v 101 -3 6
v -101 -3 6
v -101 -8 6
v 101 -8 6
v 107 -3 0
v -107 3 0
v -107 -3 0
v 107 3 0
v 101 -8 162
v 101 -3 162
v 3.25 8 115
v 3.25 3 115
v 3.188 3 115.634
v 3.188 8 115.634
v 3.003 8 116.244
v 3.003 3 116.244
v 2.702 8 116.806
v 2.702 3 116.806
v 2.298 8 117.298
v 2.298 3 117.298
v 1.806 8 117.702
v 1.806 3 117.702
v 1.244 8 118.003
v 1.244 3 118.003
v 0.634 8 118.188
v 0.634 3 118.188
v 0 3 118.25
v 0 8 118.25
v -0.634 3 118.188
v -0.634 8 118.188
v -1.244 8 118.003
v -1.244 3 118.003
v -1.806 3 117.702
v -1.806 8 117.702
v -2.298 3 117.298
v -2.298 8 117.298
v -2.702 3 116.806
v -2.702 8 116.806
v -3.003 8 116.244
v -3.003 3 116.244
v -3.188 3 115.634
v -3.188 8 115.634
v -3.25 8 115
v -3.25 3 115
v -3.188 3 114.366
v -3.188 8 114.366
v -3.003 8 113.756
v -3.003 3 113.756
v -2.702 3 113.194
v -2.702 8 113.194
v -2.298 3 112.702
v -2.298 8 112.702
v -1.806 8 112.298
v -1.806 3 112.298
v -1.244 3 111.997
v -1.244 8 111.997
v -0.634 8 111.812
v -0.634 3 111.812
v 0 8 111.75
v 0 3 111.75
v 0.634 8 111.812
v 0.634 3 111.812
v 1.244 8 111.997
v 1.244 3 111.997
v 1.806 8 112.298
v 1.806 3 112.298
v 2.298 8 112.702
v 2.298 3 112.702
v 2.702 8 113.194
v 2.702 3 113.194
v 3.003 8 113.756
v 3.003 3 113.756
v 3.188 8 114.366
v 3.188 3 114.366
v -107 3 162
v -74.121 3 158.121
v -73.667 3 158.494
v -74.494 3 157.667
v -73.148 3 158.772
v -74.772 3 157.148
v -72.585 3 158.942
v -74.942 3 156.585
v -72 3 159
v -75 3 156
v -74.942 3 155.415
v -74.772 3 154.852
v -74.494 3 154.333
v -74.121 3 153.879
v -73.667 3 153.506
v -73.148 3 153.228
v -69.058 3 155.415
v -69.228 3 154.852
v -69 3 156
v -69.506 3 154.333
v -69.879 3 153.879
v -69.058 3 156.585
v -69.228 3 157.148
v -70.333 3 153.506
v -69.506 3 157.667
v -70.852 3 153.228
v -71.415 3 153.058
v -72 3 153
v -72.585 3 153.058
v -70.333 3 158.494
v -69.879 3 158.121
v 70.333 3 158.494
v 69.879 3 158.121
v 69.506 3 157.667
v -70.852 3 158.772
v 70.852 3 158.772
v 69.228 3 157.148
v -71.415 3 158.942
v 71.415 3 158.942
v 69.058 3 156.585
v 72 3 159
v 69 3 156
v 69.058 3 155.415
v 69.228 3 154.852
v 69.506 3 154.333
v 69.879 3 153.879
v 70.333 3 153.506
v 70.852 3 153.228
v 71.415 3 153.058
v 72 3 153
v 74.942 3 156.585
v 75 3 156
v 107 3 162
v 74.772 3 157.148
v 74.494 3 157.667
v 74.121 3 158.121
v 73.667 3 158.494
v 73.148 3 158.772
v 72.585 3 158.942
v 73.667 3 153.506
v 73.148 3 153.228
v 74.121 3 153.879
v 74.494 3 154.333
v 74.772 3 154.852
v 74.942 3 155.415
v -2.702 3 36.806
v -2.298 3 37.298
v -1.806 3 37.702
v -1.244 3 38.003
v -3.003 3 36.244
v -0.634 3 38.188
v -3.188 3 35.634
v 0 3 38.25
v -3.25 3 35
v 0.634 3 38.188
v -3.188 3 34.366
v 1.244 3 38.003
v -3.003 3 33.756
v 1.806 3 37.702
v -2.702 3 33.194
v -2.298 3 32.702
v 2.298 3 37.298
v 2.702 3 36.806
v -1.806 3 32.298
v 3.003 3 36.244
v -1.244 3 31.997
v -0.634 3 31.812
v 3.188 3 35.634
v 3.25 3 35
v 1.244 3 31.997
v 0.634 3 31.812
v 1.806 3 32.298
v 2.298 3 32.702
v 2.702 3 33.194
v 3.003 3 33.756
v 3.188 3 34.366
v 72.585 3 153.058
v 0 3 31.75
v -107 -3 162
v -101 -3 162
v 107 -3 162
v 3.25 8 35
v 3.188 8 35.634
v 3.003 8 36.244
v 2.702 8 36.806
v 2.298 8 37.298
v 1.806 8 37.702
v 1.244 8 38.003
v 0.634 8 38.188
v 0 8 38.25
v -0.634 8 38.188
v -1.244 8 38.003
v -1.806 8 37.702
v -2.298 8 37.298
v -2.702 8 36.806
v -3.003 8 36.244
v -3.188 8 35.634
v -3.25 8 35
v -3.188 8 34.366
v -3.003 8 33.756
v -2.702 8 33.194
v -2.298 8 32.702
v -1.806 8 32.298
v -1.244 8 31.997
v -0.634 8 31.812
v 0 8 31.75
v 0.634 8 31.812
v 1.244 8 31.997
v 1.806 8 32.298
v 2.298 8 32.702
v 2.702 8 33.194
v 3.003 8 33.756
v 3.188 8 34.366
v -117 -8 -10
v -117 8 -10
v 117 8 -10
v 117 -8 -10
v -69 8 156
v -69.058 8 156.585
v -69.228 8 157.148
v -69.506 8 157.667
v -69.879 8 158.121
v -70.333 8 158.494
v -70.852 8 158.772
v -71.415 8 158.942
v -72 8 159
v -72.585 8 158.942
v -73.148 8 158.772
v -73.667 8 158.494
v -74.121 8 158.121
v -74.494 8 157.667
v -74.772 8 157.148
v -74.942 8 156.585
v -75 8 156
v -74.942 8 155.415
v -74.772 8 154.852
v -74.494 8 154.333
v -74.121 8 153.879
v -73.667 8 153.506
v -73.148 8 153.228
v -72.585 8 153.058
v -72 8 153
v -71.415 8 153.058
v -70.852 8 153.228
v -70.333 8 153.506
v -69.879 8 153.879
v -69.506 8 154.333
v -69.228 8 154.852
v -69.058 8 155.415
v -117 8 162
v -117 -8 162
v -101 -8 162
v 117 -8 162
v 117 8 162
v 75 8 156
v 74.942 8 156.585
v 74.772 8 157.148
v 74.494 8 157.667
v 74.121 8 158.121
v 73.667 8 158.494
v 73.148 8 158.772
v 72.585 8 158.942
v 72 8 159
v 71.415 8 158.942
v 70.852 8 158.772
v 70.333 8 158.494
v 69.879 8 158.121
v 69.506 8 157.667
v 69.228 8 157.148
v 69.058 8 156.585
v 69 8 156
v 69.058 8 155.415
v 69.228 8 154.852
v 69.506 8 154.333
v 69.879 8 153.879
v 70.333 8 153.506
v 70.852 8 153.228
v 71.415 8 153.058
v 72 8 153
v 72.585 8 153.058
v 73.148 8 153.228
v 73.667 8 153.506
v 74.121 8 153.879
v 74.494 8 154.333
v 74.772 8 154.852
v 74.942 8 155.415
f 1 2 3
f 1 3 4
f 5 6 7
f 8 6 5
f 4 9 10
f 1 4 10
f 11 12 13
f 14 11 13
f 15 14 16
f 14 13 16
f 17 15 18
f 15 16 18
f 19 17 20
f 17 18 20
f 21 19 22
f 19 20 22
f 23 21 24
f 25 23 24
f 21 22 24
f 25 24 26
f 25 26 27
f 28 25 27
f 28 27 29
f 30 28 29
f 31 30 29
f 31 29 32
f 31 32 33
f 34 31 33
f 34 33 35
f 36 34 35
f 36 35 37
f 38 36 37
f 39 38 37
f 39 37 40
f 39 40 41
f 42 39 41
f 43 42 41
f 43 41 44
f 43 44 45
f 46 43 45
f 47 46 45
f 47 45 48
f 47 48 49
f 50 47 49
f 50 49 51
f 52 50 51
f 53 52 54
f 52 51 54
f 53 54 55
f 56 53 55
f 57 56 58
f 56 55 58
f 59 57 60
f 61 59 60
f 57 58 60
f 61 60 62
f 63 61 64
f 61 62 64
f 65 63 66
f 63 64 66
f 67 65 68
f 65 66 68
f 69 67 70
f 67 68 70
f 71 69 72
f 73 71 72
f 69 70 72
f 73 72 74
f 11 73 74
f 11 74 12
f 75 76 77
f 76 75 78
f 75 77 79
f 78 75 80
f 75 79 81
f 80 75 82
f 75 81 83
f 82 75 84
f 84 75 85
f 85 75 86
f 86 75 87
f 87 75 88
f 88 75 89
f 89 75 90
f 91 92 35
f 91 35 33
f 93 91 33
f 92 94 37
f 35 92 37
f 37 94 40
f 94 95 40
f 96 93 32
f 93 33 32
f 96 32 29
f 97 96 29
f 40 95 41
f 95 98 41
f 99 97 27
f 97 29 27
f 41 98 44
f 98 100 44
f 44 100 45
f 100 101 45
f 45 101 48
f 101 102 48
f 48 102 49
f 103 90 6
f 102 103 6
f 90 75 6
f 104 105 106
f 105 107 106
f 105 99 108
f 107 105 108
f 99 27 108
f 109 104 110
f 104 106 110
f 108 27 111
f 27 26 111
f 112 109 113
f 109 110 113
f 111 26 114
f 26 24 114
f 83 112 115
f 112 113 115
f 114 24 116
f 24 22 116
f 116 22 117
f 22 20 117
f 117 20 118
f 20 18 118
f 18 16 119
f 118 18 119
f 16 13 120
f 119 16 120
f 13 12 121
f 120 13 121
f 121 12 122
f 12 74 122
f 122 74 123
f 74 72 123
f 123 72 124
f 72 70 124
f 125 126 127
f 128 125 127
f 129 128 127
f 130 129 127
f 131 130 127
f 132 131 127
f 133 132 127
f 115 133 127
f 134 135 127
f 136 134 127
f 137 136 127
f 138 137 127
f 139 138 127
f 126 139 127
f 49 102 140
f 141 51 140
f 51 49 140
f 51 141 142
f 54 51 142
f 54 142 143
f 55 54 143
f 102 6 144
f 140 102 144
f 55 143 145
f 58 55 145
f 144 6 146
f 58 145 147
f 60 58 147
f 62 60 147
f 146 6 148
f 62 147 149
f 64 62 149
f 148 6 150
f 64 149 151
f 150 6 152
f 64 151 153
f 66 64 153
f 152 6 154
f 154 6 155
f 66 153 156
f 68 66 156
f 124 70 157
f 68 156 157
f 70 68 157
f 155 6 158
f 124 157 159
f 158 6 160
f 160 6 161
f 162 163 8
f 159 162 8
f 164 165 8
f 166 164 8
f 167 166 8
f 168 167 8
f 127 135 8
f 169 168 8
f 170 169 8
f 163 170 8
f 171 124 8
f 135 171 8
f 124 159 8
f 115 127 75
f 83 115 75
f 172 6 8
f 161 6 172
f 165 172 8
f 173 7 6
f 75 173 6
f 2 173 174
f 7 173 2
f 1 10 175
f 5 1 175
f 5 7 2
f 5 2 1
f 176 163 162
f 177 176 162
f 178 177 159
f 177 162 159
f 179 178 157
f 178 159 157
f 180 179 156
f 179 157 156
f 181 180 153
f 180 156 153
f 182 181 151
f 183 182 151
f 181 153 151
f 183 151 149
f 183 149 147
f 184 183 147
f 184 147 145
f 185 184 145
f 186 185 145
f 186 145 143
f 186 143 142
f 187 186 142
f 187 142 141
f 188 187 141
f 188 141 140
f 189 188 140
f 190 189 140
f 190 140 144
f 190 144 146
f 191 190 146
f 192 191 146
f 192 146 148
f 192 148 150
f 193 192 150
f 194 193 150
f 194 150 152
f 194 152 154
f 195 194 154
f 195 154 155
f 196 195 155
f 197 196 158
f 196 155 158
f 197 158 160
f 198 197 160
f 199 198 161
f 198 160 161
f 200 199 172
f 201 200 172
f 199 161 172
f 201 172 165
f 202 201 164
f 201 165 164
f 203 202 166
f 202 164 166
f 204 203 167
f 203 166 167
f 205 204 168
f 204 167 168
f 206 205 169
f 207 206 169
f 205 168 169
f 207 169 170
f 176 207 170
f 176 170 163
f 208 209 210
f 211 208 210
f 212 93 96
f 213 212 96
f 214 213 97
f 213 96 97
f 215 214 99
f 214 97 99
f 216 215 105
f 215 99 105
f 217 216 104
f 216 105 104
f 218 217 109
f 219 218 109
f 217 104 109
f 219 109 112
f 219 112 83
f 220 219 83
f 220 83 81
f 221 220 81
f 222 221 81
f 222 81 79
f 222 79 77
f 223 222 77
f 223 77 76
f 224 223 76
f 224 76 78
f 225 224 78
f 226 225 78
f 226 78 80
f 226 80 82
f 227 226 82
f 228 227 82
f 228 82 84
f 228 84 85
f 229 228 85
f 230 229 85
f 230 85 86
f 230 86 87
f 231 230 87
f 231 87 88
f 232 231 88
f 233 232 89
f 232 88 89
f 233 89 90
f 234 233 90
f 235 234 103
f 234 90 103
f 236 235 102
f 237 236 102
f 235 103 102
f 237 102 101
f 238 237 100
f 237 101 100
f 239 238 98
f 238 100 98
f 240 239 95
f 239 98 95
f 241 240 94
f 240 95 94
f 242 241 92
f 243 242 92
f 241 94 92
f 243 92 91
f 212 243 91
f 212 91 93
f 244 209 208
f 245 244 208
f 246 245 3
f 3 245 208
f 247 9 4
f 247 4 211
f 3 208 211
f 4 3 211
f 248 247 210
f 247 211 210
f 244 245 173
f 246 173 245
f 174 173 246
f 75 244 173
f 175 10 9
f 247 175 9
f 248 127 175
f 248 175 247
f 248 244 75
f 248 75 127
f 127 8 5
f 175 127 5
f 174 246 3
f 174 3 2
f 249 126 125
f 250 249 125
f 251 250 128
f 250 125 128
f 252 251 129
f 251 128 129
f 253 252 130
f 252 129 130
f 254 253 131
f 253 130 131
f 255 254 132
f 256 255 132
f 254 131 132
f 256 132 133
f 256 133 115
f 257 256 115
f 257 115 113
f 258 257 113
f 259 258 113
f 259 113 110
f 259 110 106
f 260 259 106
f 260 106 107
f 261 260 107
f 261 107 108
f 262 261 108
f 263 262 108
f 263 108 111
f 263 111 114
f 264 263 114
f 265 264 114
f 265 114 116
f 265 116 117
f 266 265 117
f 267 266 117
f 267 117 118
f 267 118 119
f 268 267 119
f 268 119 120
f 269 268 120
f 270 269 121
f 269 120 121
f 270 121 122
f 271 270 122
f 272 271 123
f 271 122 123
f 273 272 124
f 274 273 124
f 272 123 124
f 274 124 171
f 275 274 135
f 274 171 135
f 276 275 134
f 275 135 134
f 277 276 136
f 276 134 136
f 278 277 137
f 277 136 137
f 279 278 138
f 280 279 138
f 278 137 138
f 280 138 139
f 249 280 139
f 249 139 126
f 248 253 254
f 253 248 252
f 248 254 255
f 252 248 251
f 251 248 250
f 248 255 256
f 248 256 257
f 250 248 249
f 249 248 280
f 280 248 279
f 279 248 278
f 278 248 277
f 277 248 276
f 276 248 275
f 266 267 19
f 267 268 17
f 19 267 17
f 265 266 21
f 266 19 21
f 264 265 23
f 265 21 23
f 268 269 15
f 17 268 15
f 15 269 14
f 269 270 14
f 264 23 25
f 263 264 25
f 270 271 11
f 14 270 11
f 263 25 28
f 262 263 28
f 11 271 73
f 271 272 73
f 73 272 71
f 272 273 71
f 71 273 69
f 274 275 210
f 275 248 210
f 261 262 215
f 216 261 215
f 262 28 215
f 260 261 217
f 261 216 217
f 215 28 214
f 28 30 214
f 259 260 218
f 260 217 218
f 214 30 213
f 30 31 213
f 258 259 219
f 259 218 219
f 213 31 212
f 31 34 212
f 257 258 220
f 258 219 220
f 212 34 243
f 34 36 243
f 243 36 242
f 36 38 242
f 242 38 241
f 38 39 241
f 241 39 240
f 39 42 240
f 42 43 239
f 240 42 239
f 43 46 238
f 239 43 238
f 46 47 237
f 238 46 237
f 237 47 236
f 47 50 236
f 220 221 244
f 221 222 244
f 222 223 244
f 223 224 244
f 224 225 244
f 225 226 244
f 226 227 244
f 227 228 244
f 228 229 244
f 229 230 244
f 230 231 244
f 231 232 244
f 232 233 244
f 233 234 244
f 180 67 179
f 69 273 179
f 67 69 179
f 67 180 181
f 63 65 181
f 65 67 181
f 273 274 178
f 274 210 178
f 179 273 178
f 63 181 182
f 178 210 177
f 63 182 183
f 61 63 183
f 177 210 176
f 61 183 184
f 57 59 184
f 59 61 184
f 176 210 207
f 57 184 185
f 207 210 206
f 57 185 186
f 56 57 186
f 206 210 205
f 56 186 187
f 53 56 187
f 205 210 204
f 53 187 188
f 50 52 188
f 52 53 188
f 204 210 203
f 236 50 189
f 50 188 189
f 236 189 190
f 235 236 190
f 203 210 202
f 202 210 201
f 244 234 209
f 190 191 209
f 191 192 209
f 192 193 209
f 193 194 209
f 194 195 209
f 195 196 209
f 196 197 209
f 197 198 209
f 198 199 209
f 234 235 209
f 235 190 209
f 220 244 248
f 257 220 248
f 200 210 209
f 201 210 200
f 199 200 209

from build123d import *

# Parameters (mm, degrees)
F0_W     = 214
F0_H     = 5
F0_W_2   = 202
F0_W_3   = 10
F0_H_2   = 6
F0_W_4   = 6
F1_DEPTH = 10
F2_DEPTH = 162
F3_DEPTH = 6
F4_R     = 3.25
F4_R_2   = 3
F5_DEPTH = 25


with BuildPart() as f1:
    # F0 (on Top) → F1 (new body)
    with BuildSketch(Plane.XY):
        Polygon((107, 3), (-107, 3), (-107, -3), (-101, -3), (101, -3), (107, -3), align=None)
        with Locations((0, 5.5)):
            Rectangle(F0_W, F0_H)
        with Locations((0, -5.5)):
            Rectangle(F0_W_2, F0_H)
        with Locations((-112, 0)):
            Rectangle(F0_W_3, F0_H_2)
        with Locations((-112, 5.5)):
            Rectangle(F0_W_3, F0_H)
        with Locations((-112, -5.5)):
            Rectangle(F0_W_3, F0_H)
        with Locations((-104, -5.5)):
            Rectangle(F0_W_4, F0_H)
        with Locations((112, 0)):
            Rectangle(F0_W_3, F0_H_2)
        with Locations((112, 5.5)):
            Rectangle(F0_W_3, F0_H)
        with Locations((104, -5.5)):
            Rectangle(F0_W_4, F0_H)
        with Locations((112, -5.5)):
            Rectangle(F0_W_3, F0_H)
    extrude(amount=-F1_DEPTH)

    # F0 (on Top) → F2 (join)
    with BuildSketch(Plane.XY):
        with Locations((0, 5.5)):
            Rectangle(F0_W, F0_H)
        with Locations((-112, 5.5)):
            Rectangle(F0_W_3, F0_H)
        with Locations((-112, 0)):
            Rectangle(F0_W_3, F0_H_2)
        with Locations((-112, -5.5)):
            Rectangle(F0_W_3, F0_H)
        with Locations((112, 5.5)):
            Rectangle(F0_W_3, F0_H)
        with Locations((112, 0)):
            Rectangle(F0_W_3, F0_H_2)
        with Locations((112, -5.5)):
            Rectangle(F0_W_3, F0_H)
        with Locations((104, -5.5)):
            Rectangle(F0_W_4, F0_H)
        with Locations((-104, -5.5)):
            Rectangle(F0_W_4, F0_H)
    extrude(amount=F2_DEPTH)

    # F0 (on Top) → F3 (join)
    with BuildSketch(Plane.XY):
        with Locations((0, -5.5)):
            Rectangle(F0_W_2, F0_H)
    extrude(amount=F3_DEPTH)

    # F4 (on face) → F5 (cut)
    with BuildSketch(Plane.XZ.offset(-3)):
        with Locations((0, 115)):
            Circle(F4_R)
        with Locations((72, 156)):
            Circle(F4_R_2)
        with Locations((0, 35)):
            Circle(F4_R)
        with Locations((-72, 156)):
            Circle(F4_R_2)
    extrude(amount=-F5_DEPTH, mode=Mode.SUBTRACT)


solid = f1.part
